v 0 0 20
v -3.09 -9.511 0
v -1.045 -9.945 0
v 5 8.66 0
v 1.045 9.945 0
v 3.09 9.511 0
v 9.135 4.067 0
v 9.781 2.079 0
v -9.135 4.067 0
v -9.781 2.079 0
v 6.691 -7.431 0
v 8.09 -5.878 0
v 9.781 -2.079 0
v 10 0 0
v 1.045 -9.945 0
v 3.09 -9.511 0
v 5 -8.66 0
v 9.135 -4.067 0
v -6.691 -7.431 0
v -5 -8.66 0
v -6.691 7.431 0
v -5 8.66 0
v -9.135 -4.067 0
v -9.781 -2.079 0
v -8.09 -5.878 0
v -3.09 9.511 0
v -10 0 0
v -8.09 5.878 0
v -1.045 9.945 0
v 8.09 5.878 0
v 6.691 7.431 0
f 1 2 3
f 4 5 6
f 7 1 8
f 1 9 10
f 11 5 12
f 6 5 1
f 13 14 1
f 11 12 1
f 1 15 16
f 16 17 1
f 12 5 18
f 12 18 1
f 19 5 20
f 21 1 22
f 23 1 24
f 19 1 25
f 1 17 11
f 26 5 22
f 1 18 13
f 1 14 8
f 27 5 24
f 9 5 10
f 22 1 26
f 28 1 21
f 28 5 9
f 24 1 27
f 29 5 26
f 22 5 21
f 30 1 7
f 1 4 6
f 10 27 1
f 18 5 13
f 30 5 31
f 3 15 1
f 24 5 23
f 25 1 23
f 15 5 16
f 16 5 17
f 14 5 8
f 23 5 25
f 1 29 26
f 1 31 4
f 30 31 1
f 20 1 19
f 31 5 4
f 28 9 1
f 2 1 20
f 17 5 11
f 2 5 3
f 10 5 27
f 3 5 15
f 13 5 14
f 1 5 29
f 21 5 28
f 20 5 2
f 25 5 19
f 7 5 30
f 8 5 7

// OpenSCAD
epsilon=0.000001;

// TODO Explore other ways to define this
//  Can use a polygon triangle with rotational extrude 360deg
module cone(radius, height) {
	hull() {
		translate([0, 0, height]) sphere(r=epsilon);
		cylinder(h=epsilon, r=radius);
	}
}

cone(10, 20);
